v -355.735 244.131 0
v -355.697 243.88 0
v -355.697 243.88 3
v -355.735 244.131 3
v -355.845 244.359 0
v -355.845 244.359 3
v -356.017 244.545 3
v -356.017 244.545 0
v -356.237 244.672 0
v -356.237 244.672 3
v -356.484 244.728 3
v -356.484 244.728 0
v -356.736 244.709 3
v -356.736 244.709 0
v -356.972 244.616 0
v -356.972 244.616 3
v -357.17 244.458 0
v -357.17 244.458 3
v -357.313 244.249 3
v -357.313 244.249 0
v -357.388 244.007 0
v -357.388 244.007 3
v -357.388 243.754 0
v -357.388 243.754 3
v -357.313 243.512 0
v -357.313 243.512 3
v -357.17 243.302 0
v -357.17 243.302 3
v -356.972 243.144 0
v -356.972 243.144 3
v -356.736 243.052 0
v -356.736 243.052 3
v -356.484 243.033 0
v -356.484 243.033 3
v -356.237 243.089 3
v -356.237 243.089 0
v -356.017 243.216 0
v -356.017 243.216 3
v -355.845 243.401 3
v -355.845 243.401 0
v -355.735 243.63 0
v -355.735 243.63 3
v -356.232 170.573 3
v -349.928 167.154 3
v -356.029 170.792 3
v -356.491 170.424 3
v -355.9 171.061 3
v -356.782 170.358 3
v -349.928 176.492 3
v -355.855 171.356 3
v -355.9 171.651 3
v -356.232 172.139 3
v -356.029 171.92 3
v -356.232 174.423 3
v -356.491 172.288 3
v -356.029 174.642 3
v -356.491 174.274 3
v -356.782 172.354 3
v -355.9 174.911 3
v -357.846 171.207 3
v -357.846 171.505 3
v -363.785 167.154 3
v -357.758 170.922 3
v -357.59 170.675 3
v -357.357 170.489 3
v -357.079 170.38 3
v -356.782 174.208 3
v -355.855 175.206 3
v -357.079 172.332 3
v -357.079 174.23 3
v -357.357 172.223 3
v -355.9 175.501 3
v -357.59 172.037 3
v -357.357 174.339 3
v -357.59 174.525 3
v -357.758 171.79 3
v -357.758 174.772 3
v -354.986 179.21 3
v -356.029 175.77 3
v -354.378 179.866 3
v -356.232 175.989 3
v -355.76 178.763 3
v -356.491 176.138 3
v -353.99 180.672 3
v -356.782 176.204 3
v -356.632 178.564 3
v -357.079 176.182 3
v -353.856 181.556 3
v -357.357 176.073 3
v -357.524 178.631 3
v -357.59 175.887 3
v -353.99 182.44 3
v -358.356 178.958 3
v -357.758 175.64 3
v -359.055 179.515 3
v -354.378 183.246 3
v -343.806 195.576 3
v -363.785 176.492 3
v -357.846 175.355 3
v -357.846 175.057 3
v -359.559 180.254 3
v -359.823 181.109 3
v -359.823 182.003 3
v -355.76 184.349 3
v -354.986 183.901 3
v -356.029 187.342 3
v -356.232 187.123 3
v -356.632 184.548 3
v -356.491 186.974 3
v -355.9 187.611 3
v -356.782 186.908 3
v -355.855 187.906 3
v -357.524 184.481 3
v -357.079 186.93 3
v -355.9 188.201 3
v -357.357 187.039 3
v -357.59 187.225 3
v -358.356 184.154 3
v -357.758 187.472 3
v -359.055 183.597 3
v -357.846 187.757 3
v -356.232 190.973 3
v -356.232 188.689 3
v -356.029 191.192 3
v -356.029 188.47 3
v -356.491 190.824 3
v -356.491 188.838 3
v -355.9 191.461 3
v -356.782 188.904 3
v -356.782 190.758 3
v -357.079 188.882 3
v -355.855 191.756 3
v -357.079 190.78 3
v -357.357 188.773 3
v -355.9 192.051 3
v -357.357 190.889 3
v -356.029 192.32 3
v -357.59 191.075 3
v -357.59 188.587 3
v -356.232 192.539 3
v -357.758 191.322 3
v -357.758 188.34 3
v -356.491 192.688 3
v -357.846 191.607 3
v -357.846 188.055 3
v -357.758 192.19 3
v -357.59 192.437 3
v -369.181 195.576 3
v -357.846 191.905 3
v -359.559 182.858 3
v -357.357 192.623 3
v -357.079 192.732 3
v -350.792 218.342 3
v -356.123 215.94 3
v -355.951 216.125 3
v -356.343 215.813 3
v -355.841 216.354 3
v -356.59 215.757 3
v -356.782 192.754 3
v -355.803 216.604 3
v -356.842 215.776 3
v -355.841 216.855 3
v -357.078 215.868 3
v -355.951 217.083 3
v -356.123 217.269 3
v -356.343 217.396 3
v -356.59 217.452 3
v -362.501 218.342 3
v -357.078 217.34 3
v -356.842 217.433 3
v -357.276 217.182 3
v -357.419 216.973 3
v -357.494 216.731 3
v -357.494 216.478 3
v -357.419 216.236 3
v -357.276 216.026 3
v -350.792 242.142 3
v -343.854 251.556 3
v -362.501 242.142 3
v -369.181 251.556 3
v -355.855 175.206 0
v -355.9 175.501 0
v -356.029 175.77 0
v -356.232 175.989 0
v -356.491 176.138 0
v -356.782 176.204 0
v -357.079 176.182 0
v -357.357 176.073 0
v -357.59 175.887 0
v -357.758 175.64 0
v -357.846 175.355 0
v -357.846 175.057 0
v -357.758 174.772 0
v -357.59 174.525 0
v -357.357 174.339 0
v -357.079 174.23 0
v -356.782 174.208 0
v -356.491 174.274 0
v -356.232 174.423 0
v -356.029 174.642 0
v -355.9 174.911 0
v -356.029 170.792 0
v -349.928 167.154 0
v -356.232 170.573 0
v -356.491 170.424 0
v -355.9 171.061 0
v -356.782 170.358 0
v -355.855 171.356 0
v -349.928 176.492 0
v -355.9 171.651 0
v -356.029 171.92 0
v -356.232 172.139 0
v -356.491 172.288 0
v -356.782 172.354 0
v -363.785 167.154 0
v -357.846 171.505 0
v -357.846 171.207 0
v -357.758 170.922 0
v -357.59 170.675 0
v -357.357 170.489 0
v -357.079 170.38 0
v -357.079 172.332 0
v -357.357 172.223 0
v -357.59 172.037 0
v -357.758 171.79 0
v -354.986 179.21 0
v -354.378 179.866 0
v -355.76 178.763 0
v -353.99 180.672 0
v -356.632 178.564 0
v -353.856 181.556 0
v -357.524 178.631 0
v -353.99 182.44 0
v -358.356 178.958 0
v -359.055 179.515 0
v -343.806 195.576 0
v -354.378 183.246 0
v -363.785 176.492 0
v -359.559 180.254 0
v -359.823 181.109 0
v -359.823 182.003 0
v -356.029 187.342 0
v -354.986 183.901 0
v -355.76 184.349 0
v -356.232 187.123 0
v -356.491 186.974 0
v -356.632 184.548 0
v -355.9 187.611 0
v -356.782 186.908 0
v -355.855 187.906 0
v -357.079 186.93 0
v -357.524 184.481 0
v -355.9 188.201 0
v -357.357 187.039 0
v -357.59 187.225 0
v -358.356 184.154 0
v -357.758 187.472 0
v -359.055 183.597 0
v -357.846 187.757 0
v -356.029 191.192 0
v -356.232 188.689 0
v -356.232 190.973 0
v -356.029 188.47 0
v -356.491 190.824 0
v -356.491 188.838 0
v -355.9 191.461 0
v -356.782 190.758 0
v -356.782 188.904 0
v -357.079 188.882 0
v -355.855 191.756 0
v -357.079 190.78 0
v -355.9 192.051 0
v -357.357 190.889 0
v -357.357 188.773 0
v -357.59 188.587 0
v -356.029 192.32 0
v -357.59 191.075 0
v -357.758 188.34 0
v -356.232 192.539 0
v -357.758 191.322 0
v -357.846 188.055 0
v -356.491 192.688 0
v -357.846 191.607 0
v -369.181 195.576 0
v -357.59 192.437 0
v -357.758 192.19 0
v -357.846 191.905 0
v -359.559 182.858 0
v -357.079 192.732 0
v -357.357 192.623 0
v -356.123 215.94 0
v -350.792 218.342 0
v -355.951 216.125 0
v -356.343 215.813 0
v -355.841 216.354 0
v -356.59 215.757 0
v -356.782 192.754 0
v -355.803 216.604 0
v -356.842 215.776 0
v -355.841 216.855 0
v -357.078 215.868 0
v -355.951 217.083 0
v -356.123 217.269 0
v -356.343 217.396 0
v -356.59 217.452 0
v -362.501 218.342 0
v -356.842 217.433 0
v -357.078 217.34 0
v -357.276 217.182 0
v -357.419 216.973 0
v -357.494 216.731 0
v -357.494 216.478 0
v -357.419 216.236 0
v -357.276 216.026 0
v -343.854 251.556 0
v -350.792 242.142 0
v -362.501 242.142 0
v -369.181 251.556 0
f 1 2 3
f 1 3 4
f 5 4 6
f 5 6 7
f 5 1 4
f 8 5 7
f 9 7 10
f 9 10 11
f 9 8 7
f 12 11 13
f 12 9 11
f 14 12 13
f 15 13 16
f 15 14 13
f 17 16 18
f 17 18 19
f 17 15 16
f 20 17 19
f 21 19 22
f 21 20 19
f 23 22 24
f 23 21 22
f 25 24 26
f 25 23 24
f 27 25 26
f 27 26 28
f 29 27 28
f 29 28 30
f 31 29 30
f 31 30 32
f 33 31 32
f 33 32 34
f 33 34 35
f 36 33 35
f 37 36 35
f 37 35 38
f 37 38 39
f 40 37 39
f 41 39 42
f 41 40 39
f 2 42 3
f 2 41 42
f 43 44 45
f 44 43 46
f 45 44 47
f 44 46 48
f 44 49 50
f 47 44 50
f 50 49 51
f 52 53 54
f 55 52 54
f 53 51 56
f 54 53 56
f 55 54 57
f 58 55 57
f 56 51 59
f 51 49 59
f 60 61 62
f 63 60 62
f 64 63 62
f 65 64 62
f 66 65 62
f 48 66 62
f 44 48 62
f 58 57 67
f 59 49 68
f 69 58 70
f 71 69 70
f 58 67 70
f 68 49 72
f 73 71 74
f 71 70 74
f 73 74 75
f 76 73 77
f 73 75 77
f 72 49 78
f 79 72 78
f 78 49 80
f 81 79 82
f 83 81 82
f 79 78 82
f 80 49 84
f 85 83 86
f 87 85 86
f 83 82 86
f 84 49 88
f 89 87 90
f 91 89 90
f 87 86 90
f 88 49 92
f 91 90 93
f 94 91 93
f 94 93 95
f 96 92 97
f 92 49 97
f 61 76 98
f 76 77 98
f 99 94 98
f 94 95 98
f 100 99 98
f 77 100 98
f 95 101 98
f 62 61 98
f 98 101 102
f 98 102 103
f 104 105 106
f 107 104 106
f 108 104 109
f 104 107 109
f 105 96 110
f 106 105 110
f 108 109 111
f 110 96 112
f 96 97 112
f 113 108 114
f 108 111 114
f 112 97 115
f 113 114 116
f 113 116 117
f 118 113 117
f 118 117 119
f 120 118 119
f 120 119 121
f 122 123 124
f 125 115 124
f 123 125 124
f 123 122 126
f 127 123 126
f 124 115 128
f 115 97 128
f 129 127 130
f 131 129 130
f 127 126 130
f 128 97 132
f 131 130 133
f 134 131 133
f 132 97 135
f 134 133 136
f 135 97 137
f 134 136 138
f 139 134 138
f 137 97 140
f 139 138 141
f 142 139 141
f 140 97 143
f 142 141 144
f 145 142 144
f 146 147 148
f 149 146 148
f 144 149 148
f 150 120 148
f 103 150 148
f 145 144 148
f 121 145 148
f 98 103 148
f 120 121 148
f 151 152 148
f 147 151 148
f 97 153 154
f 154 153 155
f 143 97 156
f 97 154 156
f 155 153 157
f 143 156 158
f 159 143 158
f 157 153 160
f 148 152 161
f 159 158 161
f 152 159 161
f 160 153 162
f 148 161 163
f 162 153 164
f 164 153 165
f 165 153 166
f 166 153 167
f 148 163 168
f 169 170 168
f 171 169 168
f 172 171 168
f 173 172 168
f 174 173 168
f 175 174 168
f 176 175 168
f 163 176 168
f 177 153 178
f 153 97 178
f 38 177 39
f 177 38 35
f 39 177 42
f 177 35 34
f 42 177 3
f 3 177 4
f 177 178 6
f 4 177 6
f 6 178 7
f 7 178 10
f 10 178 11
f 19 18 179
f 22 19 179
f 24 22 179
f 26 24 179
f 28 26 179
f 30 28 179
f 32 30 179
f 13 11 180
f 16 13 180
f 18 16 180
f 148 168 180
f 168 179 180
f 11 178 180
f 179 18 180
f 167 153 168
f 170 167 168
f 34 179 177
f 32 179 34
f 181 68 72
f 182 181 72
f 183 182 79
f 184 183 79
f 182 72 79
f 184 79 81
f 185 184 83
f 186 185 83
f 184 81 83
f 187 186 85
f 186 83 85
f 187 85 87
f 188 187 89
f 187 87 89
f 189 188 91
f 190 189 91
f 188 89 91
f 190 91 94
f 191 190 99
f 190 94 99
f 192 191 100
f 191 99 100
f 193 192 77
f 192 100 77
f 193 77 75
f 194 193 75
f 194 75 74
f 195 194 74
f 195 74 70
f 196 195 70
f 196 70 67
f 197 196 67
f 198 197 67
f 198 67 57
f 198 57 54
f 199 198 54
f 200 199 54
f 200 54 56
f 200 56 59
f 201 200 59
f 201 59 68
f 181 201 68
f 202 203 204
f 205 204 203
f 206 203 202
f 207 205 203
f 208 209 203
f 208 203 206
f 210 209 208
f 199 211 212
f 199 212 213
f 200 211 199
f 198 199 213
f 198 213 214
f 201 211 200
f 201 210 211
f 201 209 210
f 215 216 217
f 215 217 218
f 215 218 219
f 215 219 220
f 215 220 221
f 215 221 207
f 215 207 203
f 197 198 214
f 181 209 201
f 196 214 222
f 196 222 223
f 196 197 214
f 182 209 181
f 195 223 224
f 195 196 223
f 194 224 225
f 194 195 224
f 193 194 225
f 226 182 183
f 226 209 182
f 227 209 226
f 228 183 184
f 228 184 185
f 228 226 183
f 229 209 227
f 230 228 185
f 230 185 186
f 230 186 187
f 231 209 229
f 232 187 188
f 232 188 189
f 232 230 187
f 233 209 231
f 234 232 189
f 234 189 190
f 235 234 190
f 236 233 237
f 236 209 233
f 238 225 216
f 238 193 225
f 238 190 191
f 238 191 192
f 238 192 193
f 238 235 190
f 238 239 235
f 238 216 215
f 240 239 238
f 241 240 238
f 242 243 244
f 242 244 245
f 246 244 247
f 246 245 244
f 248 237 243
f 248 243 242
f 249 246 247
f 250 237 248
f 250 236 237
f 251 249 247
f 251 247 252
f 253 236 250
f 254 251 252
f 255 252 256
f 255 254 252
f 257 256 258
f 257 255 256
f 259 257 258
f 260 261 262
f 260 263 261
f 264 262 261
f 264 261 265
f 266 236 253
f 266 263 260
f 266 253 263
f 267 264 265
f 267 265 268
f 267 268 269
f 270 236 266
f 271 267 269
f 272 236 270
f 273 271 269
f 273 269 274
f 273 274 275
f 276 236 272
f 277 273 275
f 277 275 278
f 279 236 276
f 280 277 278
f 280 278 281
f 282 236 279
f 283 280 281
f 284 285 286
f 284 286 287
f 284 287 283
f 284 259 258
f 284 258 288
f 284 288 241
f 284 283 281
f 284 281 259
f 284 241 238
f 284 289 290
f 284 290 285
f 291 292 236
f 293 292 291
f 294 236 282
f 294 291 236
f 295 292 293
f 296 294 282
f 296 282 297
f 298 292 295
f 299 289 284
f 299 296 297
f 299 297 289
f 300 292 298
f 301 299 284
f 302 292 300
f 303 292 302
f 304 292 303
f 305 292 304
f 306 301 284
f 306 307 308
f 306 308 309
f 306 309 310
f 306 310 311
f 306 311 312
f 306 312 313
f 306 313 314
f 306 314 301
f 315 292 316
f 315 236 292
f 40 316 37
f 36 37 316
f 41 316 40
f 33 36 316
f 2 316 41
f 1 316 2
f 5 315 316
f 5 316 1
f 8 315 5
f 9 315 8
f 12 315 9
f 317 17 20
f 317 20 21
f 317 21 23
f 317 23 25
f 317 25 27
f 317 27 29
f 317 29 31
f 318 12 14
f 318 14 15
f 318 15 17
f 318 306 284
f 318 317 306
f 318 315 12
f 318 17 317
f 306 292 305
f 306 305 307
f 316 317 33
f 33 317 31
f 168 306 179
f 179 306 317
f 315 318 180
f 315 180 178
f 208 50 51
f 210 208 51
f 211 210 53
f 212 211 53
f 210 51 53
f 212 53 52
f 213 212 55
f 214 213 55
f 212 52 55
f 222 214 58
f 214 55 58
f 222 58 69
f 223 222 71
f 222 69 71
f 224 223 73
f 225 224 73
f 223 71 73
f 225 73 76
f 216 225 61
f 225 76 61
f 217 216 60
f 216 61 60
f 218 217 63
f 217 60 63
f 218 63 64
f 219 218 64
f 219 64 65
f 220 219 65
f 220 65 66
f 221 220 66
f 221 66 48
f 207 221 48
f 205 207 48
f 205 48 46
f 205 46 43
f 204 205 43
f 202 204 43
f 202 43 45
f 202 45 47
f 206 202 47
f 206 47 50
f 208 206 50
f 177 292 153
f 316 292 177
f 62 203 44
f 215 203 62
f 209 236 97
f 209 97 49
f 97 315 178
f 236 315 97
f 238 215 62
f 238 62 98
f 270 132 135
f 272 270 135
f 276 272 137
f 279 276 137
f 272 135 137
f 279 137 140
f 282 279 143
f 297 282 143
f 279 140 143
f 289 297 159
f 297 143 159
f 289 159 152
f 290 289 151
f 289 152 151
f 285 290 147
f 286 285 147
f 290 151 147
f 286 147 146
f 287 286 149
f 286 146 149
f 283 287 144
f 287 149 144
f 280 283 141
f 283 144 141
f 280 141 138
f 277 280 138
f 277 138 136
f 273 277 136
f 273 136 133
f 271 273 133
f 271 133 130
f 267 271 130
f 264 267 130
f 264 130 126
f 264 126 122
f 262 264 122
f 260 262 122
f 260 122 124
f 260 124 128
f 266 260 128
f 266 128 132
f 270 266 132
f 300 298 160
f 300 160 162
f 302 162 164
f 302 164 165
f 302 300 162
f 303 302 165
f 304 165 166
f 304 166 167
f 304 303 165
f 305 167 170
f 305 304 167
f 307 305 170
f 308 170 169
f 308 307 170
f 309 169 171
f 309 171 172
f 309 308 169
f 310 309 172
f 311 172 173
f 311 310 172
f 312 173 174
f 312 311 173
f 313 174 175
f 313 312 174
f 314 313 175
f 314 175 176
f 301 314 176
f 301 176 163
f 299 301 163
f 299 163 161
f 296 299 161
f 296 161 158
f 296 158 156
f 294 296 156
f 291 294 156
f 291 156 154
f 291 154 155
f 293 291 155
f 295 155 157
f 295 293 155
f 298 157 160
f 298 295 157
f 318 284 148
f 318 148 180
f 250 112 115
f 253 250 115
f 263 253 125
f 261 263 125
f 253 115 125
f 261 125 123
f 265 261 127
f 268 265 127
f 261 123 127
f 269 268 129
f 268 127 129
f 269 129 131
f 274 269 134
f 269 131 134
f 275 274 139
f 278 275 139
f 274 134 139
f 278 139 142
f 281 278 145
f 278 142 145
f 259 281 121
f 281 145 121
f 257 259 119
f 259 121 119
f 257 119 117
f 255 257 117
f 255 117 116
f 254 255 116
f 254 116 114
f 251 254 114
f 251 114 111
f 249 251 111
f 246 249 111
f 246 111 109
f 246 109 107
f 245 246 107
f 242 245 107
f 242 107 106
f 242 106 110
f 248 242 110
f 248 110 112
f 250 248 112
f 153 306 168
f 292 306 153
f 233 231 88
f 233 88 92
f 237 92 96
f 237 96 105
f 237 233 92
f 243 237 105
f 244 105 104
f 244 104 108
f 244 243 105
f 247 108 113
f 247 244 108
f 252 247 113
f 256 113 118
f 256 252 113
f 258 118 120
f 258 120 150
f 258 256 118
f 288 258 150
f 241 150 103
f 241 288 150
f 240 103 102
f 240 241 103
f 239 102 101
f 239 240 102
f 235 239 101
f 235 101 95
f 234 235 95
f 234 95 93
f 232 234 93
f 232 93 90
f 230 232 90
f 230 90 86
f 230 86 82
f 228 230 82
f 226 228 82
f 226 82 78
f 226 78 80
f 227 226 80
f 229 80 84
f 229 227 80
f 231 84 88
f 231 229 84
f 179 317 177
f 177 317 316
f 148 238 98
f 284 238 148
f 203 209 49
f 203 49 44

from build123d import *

# Parameters (mm, degrees)
SKETCH1_R           = 0.85
SKETCH1_R_2         = 3
SKETCH1_W           = 11.7094
SKETCH1_H           = 23.7998
BOSS_EXTRUDE3_DEPTH = 3
SKETCH2_R           = 1.0009
CUT_EXTRUDE1_DEPTH  = 447.747926613


with BuildPart() as part:
    # Sketch1 → Boss-Extrude3 (new body)
    with BuildSketch(Plane.XY):
        Polygon((-363.784573438, 176.492478394), (-369.180567886, 195.576225703), (-369.180567886, 251.55599422), (-343.853730339, 251.55599422), (-343.806464443, 195.576225703), (-349.928026562, 176.492478394), (-349.928026562, 167.153932289), (-363.784573438, 167.153932289), align=None)
        with Locations((-356.653301567, 216.60430982)):
            Circle(SKETCH1_R, mode=Mode.SUBTRACT)
        with Locations((-356.547049339, 243.88030982)):
            Circle(SKETCH1_R, mode=Mode.SUBTRACT)
        with Locations((-356.8563, 181.55599422)):
            Circle(SKETCH1_R_2, mode=Mode.SUBTRACT)
        with Locations((-356.646530889, 230.24230982)):
            Rectangle(SKETCH1_W, SKETCH1_H, mode=Mode.SUBTRACT)
    extrude(amount=BOSS_EXTRUDE3_DEPTH)

    # Sketch2 → Cut-Extrude1 (cut, through all)
    with BuildSketch(Plane.XY.offset(3)):
        with Locations((-356.8563, 171.35599422)):
            Circle(SKETCH2_R)
        with Locations((-356.8563, 175.20599422)):
            Circle(SKETCH2_R)
        with Locations((-356.8563, 187.90599422)):
            Circle(SKETCH2_R)
        with Locations((-356.8563, 191.75599422)):
            Circle(SKETCH2_R)
    extrude(amount=-CUT_EXTRUDE1_DEPTH, mode=Mode.SUBTRACT)


solid = part.part
